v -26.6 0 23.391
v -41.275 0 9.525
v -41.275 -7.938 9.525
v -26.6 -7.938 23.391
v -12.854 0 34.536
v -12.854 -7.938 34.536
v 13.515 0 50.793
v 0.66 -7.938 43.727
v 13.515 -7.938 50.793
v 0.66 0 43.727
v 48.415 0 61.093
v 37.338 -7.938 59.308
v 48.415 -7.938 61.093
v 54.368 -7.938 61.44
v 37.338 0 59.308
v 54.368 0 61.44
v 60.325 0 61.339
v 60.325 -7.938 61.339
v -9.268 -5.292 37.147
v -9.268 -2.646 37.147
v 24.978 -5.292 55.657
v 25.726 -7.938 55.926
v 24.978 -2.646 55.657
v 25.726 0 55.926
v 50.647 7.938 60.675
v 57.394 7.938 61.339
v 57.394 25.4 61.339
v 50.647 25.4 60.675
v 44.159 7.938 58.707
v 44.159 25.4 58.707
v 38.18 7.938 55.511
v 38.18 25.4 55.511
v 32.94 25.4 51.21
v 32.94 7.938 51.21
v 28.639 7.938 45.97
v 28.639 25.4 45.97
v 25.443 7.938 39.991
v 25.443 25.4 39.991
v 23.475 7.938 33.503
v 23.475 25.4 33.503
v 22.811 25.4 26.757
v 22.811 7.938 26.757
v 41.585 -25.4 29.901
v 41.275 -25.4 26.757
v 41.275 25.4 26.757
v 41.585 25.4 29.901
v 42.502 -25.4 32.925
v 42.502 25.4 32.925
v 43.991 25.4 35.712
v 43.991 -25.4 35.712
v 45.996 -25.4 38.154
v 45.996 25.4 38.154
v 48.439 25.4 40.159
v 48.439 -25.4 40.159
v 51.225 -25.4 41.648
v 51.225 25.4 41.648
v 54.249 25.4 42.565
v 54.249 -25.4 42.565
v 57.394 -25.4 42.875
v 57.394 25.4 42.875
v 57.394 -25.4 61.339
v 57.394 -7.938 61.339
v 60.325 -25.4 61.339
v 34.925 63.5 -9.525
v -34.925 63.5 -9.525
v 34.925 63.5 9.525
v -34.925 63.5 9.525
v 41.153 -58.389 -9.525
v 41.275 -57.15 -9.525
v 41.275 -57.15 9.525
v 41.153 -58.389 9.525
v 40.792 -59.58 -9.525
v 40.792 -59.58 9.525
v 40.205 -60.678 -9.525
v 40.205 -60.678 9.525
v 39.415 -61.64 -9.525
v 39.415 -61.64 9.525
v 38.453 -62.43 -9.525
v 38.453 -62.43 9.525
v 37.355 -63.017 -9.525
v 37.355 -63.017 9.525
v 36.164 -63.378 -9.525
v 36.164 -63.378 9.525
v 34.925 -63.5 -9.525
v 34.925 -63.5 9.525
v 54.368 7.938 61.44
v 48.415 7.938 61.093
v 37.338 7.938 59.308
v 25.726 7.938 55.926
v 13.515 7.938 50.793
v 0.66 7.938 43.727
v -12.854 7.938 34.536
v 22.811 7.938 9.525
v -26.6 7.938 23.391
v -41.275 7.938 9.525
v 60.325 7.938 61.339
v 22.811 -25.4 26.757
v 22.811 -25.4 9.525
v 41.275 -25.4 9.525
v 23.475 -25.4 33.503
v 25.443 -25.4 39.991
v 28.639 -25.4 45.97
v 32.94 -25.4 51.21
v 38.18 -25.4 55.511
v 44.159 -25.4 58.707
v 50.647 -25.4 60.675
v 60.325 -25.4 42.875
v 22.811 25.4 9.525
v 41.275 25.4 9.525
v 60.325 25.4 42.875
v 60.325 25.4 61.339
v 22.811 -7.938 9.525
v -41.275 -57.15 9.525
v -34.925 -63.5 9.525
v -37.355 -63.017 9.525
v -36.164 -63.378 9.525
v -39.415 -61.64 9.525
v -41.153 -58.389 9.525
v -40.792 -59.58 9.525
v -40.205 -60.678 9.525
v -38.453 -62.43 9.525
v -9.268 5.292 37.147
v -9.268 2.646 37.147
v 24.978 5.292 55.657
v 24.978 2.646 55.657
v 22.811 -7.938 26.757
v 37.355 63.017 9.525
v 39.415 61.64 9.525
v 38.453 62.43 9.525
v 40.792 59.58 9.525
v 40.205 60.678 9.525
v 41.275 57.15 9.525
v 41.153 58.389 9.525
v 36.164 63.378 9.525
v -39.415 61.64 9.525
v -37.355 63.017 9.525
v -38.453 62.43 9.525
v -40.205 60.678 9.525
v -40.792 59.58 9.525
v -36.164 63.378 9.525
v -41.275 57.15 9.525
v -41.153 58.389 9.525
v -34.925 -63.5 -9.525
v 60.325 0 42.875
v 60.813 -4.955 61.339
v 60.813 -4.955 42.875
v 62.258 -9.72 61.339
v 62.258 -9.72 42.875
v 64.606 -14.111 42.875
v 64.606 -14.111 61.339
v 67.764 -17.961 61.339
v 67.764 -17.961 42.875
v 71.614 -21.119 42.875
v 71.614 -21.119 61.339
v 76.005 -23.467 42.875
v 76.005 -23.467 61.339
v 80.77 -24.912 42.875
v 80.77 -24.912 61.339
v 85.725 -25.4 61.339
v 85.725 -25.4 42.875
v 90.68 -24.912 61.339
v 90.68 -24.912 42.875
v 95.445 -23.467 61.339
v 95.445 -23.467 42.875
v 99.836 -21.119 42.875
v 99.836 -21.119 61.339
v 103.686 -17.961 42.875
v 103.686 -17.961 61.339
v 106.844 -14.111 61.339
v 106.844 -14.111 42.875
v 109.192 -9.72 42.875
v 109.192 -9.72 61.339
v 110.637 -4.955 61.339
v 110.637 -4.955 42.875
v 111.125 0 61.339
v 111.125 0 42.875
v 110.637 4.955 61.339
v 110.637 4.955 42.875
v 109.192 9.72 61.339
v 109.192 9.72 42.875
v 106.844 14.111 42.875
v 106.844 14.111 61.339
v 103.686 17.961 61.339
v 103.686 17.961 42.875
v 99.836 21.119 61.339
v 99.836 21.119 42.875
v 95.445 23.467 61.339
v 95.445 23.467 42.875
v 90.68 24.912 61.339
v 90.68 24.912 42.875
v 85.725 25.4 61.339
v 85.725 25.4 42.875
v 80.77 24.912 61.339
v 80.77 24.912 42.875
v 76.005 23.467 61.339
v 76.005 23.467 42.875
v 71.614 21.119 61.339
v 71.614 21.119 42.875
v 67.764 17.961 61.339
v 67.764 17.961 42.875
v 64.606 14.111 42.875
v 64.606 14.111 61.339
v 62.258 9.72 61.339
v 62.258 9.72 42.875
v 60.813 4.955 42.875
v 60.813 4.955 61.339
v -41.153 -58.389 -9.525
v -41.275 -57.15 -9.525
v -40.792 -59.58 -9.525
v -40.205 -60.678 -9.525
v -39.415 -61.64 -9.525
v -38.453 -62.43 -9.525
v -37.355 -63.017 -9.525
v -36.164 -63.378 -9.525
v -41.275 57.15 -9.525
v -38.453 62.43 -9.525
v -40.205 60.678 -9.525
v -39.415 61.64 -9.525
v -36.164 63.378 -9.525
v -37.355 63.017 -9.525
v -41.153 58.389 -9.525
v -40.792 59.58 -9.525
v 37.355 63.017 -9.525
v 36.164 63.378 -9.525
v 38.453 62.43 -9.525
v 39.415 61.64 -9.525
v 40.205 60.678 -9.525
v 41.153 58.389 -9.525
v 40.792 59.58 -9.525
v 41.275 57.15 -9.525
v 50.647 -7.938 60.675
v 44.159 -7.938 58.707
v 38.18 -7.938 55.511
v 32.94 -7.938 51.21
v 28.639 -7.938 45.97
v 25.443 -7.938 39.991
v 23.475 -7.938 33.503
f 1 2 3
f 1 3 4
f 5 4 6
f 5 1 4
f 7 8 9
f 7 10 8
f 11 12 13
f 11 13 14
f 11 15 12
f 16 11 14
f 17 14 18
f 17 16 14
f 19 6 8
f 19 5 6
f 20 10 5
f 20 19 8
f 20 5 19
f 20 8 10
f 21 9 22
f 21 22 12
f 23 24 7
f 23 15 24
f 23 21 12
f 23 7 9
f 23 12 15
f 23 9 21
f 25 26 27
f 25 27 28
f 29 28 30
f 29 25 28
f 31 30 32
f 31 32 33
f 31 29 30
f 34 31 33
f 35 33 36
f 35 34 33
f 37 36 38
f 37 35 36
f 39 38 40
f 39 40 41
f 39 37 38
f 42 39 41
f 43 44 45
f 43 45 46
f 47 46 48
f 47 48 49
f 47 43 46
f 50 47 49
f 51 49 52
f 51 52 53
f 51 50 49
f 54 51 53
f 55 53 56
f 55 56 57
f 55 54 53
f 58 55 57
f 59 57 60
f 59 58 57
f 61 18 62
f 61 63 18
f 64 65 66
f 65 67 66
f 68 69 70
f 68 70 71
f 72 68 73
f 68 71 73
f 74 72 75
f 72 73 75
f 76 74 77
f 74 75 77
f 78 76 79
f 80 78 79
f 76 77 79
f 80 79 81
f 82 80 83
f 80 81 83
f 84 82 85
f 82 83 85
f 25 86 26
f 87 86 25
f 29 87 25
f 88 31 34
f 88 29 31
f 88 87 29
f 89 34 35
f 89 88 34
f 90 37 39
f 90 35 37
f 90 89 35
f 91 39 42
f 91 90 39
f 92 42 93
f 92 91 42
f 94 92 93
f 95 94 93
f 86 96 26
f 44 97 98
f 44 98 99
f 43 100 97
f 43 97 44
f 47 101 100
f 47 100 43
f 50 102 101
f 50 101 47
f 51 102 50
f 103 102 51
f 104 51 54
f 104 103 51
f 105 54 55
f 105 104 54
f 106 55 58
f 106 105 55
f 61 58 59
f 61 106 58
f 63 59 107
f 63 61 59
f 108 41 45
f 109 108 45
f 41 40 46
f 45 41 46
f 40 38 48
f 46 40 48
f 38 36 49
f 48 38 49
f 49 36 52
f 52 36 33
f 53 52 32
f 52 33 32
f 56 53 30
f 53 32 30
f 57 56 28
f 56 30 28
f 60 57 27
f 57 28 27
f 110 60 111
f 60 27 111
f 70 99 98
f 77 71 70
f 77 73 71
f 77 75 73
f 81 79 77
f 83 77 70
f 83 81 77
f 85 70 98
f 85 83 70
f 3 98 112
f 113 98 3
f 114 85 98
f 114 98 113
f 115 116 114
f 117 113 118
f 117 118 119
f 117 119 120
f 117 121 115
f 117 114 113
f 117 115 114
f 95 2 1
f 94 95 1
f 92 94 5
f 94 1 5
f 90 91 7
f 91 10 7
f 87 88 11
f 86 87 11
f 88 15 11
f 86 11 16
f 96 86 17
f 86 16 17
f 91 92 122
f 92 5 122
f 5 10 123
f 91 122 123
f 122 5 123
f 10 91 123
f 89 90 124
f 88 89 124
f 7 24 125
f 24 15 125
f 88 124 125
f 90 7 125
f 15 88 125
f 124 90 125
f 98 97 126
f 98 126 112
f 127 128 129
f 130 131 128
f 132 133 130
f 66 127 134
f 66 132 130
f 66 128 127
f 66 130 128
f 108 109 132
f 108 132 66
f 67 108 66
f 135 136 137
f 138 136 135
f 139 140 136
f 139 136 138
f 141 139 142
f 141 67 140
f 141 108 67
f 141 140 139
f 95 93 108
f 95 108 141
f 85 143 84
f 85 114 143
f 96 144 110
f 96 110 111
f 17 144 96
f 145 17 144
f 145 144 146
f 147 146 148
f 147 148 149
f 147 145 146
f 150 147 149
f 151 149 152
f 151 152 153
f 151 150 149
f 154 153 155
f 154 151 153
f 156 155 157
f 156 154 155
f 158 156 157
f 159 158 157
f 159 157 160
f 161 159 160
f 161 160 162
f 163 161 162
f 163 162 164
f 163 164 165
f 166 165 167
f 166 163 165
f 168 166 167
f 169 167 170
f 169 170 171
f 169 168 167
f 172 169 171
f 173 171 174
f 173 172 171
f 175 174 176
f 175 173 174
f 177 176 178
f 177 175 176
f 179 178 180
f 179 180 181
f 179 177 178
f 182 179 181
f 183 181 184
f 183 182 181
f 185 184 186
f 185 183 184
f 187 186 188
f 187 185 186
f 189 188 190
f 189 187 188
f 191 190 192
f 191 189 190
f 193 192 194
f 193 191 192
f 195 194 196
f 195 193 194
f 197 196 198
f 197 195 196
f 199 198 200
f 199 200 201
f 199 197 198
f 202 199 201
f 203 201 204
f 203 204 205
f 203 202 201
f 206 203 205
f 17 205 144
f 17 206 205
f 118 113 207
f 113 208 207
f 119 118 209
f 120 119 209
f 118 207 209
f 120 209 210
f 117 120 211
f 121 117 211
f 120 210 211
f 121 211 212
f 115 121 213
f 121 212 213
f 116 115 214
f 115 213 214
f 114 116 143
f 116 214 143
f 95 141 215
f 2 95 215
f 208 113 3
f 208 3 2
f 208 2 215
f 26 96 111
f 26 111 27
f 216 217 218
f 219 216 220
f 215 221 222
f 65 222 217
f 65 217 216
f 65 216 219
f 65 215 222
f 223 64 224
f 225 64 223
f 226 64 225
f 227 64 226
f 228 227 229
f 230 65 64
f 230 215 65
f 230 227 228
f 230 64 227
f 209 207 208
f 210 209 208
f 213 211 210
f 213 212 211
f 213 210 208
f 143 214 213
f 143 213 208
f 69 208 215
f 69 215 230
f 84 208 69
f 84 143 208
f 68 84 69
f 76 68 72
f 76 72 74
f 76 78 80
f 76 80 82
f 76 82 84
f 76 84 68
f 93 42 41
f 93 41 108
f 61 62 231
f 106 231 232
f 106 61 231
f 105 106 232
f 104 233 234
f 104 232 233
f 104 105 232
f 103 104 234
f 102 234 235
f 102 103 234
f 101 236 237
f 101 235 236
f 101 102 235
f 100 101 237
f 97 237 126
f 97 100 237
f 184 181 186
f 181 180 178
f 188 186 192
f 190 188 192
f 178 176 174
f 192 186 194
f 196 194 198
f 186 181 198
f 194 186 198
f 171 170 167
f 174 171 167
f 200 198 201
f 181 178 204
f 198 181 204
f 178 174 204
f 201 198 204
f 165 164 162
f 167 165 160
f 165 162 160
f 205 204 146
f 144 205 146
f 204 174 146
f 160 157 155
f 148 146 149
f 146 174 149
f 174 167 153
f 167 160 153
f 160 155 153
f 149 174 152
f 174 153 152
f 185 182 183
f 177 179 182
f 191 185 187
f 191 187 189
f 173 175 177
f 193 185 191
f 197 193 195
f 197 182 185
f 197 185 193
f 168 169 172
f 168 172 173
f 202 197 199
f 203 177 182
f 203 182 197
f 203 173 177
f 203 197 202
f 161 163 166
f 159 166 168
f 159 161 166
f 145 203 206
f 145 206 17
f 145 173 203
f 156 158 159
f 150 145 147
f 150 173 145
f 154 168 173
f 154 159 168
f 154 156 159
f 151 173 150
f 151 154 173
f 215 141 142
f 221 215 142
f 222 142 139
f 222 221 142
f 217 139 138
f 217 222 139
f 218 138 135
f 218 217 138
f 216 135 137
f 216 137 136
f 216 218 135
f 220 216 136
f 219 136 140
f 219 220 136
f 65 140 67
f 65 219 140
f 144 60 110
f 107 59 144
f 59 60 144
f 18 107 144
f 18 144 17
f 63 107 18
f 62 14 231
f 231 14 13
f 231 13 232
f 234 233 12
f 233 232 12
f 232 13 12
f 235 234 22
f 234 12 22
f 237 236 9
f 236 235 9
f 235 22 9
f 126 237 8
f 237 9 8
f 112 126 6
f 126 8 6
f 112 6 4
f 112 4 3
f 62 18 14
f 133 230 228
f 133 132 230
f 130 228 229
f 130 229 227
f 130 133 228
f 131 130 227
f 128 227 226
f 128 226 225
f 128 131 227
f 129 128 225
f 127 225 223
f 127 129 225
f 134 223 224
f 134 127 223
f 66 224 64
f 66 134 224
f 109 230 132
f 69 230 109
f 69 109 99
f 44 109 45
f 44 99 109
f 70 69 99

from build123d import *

# Parameters (mm, degrees)
F1_DEPTH = 63.5
F2_DEPTH = 25.4
F3_DEPTH = 7.9375
F0_W     = 25.4
F0_H     = 18.464088
F5_R     = 6.35


with BuildPart() as f1:
    # F0 (on Front) → F1 (new body, symmetric)
    with BuildSketch(Plane.XZ):
        Polygon((22.810912, 9.525), (-41.275, 9.525), (-41.275, -9.525), (41.275, -9.525), (41.275, 9.525), align=None)
    extrude(amount=F1_DEPTH, both=True)

    # F0 (on Front) → F2 (join, symmetric)
    with BuildSketch(Plane.XZ):
        with BuildLine():
            Line((22.810912, 26.756578), (22.810912, 9.525))
            Line((22.810912, 9.525), (41.275, 9.525))
            Line((41.275, 9.525), (41.275, 26.756578))
            ThreePointArc((41.275, 26.756578), (45.996035, 38.154165), (57.393622, 42.8752))
            Line((57.393622, 42.8752), (60.325, 42.8752))
            Line((60.325, 42.8752), (60.325, 61.339288))
            Line((60.325, 61.339288), (57.393622, 61.339288))
            ThreePointArc((57.393622, 61.339288), (32.939953, 51.210247), (22.810912, 26.756578))
        make_face()
    extrude(amount=F2_DEPTH, both=True)

    # F0 (on Front) → F3 (join, symmetric)
    with BuildSketch(Plane.XZ):
        with BuildLine():
            add(Edge.make_bspline(
                [(-41.275, 9.525), (-10.767165, 40.46579), (24.806041, 63.308753), (60.325, 61.339288)],
                knots=[0, 0, 0, 0, 114.049465, 114.049465, 114.049465, 114.049465], degree=3))
            Line((-41.275, 9.525), (22.810912, 9.525))
            Line((22.810912, 9.525), (22.810912, 26.756578))
            ThreePointArc((22.810912, 26.756578), (32.939953, 51.210247), (57.393622, 61.339288))
            Line((57.393622, 61.339288), (60.325, 61.339288))
        make_face()
    extrude(amount=F3_DEPTH, both=True)

    # F0 (on Front) → F4 (revolve)
    with BuildSketch(Plane.XZ):
        with Locations((73.025, 52.107244)):
            Rectangle(F0_W, F0_H)
    revolve(axis=Axis((85.725, 0, 52.107244), (0, 0, 1)))

    # F5
    f5_edges = [f1.edges().sort_by_distance(p)[0] for p in [
        (41.275, -63.5, 0),
        (-41.275, -63.5, 0),
        (-41.275, 63.5, 0),
        (41.275, 63.5, 0),
    ]]
    fillet(f5_edges, radius=F5_R)


solid = f1.part
